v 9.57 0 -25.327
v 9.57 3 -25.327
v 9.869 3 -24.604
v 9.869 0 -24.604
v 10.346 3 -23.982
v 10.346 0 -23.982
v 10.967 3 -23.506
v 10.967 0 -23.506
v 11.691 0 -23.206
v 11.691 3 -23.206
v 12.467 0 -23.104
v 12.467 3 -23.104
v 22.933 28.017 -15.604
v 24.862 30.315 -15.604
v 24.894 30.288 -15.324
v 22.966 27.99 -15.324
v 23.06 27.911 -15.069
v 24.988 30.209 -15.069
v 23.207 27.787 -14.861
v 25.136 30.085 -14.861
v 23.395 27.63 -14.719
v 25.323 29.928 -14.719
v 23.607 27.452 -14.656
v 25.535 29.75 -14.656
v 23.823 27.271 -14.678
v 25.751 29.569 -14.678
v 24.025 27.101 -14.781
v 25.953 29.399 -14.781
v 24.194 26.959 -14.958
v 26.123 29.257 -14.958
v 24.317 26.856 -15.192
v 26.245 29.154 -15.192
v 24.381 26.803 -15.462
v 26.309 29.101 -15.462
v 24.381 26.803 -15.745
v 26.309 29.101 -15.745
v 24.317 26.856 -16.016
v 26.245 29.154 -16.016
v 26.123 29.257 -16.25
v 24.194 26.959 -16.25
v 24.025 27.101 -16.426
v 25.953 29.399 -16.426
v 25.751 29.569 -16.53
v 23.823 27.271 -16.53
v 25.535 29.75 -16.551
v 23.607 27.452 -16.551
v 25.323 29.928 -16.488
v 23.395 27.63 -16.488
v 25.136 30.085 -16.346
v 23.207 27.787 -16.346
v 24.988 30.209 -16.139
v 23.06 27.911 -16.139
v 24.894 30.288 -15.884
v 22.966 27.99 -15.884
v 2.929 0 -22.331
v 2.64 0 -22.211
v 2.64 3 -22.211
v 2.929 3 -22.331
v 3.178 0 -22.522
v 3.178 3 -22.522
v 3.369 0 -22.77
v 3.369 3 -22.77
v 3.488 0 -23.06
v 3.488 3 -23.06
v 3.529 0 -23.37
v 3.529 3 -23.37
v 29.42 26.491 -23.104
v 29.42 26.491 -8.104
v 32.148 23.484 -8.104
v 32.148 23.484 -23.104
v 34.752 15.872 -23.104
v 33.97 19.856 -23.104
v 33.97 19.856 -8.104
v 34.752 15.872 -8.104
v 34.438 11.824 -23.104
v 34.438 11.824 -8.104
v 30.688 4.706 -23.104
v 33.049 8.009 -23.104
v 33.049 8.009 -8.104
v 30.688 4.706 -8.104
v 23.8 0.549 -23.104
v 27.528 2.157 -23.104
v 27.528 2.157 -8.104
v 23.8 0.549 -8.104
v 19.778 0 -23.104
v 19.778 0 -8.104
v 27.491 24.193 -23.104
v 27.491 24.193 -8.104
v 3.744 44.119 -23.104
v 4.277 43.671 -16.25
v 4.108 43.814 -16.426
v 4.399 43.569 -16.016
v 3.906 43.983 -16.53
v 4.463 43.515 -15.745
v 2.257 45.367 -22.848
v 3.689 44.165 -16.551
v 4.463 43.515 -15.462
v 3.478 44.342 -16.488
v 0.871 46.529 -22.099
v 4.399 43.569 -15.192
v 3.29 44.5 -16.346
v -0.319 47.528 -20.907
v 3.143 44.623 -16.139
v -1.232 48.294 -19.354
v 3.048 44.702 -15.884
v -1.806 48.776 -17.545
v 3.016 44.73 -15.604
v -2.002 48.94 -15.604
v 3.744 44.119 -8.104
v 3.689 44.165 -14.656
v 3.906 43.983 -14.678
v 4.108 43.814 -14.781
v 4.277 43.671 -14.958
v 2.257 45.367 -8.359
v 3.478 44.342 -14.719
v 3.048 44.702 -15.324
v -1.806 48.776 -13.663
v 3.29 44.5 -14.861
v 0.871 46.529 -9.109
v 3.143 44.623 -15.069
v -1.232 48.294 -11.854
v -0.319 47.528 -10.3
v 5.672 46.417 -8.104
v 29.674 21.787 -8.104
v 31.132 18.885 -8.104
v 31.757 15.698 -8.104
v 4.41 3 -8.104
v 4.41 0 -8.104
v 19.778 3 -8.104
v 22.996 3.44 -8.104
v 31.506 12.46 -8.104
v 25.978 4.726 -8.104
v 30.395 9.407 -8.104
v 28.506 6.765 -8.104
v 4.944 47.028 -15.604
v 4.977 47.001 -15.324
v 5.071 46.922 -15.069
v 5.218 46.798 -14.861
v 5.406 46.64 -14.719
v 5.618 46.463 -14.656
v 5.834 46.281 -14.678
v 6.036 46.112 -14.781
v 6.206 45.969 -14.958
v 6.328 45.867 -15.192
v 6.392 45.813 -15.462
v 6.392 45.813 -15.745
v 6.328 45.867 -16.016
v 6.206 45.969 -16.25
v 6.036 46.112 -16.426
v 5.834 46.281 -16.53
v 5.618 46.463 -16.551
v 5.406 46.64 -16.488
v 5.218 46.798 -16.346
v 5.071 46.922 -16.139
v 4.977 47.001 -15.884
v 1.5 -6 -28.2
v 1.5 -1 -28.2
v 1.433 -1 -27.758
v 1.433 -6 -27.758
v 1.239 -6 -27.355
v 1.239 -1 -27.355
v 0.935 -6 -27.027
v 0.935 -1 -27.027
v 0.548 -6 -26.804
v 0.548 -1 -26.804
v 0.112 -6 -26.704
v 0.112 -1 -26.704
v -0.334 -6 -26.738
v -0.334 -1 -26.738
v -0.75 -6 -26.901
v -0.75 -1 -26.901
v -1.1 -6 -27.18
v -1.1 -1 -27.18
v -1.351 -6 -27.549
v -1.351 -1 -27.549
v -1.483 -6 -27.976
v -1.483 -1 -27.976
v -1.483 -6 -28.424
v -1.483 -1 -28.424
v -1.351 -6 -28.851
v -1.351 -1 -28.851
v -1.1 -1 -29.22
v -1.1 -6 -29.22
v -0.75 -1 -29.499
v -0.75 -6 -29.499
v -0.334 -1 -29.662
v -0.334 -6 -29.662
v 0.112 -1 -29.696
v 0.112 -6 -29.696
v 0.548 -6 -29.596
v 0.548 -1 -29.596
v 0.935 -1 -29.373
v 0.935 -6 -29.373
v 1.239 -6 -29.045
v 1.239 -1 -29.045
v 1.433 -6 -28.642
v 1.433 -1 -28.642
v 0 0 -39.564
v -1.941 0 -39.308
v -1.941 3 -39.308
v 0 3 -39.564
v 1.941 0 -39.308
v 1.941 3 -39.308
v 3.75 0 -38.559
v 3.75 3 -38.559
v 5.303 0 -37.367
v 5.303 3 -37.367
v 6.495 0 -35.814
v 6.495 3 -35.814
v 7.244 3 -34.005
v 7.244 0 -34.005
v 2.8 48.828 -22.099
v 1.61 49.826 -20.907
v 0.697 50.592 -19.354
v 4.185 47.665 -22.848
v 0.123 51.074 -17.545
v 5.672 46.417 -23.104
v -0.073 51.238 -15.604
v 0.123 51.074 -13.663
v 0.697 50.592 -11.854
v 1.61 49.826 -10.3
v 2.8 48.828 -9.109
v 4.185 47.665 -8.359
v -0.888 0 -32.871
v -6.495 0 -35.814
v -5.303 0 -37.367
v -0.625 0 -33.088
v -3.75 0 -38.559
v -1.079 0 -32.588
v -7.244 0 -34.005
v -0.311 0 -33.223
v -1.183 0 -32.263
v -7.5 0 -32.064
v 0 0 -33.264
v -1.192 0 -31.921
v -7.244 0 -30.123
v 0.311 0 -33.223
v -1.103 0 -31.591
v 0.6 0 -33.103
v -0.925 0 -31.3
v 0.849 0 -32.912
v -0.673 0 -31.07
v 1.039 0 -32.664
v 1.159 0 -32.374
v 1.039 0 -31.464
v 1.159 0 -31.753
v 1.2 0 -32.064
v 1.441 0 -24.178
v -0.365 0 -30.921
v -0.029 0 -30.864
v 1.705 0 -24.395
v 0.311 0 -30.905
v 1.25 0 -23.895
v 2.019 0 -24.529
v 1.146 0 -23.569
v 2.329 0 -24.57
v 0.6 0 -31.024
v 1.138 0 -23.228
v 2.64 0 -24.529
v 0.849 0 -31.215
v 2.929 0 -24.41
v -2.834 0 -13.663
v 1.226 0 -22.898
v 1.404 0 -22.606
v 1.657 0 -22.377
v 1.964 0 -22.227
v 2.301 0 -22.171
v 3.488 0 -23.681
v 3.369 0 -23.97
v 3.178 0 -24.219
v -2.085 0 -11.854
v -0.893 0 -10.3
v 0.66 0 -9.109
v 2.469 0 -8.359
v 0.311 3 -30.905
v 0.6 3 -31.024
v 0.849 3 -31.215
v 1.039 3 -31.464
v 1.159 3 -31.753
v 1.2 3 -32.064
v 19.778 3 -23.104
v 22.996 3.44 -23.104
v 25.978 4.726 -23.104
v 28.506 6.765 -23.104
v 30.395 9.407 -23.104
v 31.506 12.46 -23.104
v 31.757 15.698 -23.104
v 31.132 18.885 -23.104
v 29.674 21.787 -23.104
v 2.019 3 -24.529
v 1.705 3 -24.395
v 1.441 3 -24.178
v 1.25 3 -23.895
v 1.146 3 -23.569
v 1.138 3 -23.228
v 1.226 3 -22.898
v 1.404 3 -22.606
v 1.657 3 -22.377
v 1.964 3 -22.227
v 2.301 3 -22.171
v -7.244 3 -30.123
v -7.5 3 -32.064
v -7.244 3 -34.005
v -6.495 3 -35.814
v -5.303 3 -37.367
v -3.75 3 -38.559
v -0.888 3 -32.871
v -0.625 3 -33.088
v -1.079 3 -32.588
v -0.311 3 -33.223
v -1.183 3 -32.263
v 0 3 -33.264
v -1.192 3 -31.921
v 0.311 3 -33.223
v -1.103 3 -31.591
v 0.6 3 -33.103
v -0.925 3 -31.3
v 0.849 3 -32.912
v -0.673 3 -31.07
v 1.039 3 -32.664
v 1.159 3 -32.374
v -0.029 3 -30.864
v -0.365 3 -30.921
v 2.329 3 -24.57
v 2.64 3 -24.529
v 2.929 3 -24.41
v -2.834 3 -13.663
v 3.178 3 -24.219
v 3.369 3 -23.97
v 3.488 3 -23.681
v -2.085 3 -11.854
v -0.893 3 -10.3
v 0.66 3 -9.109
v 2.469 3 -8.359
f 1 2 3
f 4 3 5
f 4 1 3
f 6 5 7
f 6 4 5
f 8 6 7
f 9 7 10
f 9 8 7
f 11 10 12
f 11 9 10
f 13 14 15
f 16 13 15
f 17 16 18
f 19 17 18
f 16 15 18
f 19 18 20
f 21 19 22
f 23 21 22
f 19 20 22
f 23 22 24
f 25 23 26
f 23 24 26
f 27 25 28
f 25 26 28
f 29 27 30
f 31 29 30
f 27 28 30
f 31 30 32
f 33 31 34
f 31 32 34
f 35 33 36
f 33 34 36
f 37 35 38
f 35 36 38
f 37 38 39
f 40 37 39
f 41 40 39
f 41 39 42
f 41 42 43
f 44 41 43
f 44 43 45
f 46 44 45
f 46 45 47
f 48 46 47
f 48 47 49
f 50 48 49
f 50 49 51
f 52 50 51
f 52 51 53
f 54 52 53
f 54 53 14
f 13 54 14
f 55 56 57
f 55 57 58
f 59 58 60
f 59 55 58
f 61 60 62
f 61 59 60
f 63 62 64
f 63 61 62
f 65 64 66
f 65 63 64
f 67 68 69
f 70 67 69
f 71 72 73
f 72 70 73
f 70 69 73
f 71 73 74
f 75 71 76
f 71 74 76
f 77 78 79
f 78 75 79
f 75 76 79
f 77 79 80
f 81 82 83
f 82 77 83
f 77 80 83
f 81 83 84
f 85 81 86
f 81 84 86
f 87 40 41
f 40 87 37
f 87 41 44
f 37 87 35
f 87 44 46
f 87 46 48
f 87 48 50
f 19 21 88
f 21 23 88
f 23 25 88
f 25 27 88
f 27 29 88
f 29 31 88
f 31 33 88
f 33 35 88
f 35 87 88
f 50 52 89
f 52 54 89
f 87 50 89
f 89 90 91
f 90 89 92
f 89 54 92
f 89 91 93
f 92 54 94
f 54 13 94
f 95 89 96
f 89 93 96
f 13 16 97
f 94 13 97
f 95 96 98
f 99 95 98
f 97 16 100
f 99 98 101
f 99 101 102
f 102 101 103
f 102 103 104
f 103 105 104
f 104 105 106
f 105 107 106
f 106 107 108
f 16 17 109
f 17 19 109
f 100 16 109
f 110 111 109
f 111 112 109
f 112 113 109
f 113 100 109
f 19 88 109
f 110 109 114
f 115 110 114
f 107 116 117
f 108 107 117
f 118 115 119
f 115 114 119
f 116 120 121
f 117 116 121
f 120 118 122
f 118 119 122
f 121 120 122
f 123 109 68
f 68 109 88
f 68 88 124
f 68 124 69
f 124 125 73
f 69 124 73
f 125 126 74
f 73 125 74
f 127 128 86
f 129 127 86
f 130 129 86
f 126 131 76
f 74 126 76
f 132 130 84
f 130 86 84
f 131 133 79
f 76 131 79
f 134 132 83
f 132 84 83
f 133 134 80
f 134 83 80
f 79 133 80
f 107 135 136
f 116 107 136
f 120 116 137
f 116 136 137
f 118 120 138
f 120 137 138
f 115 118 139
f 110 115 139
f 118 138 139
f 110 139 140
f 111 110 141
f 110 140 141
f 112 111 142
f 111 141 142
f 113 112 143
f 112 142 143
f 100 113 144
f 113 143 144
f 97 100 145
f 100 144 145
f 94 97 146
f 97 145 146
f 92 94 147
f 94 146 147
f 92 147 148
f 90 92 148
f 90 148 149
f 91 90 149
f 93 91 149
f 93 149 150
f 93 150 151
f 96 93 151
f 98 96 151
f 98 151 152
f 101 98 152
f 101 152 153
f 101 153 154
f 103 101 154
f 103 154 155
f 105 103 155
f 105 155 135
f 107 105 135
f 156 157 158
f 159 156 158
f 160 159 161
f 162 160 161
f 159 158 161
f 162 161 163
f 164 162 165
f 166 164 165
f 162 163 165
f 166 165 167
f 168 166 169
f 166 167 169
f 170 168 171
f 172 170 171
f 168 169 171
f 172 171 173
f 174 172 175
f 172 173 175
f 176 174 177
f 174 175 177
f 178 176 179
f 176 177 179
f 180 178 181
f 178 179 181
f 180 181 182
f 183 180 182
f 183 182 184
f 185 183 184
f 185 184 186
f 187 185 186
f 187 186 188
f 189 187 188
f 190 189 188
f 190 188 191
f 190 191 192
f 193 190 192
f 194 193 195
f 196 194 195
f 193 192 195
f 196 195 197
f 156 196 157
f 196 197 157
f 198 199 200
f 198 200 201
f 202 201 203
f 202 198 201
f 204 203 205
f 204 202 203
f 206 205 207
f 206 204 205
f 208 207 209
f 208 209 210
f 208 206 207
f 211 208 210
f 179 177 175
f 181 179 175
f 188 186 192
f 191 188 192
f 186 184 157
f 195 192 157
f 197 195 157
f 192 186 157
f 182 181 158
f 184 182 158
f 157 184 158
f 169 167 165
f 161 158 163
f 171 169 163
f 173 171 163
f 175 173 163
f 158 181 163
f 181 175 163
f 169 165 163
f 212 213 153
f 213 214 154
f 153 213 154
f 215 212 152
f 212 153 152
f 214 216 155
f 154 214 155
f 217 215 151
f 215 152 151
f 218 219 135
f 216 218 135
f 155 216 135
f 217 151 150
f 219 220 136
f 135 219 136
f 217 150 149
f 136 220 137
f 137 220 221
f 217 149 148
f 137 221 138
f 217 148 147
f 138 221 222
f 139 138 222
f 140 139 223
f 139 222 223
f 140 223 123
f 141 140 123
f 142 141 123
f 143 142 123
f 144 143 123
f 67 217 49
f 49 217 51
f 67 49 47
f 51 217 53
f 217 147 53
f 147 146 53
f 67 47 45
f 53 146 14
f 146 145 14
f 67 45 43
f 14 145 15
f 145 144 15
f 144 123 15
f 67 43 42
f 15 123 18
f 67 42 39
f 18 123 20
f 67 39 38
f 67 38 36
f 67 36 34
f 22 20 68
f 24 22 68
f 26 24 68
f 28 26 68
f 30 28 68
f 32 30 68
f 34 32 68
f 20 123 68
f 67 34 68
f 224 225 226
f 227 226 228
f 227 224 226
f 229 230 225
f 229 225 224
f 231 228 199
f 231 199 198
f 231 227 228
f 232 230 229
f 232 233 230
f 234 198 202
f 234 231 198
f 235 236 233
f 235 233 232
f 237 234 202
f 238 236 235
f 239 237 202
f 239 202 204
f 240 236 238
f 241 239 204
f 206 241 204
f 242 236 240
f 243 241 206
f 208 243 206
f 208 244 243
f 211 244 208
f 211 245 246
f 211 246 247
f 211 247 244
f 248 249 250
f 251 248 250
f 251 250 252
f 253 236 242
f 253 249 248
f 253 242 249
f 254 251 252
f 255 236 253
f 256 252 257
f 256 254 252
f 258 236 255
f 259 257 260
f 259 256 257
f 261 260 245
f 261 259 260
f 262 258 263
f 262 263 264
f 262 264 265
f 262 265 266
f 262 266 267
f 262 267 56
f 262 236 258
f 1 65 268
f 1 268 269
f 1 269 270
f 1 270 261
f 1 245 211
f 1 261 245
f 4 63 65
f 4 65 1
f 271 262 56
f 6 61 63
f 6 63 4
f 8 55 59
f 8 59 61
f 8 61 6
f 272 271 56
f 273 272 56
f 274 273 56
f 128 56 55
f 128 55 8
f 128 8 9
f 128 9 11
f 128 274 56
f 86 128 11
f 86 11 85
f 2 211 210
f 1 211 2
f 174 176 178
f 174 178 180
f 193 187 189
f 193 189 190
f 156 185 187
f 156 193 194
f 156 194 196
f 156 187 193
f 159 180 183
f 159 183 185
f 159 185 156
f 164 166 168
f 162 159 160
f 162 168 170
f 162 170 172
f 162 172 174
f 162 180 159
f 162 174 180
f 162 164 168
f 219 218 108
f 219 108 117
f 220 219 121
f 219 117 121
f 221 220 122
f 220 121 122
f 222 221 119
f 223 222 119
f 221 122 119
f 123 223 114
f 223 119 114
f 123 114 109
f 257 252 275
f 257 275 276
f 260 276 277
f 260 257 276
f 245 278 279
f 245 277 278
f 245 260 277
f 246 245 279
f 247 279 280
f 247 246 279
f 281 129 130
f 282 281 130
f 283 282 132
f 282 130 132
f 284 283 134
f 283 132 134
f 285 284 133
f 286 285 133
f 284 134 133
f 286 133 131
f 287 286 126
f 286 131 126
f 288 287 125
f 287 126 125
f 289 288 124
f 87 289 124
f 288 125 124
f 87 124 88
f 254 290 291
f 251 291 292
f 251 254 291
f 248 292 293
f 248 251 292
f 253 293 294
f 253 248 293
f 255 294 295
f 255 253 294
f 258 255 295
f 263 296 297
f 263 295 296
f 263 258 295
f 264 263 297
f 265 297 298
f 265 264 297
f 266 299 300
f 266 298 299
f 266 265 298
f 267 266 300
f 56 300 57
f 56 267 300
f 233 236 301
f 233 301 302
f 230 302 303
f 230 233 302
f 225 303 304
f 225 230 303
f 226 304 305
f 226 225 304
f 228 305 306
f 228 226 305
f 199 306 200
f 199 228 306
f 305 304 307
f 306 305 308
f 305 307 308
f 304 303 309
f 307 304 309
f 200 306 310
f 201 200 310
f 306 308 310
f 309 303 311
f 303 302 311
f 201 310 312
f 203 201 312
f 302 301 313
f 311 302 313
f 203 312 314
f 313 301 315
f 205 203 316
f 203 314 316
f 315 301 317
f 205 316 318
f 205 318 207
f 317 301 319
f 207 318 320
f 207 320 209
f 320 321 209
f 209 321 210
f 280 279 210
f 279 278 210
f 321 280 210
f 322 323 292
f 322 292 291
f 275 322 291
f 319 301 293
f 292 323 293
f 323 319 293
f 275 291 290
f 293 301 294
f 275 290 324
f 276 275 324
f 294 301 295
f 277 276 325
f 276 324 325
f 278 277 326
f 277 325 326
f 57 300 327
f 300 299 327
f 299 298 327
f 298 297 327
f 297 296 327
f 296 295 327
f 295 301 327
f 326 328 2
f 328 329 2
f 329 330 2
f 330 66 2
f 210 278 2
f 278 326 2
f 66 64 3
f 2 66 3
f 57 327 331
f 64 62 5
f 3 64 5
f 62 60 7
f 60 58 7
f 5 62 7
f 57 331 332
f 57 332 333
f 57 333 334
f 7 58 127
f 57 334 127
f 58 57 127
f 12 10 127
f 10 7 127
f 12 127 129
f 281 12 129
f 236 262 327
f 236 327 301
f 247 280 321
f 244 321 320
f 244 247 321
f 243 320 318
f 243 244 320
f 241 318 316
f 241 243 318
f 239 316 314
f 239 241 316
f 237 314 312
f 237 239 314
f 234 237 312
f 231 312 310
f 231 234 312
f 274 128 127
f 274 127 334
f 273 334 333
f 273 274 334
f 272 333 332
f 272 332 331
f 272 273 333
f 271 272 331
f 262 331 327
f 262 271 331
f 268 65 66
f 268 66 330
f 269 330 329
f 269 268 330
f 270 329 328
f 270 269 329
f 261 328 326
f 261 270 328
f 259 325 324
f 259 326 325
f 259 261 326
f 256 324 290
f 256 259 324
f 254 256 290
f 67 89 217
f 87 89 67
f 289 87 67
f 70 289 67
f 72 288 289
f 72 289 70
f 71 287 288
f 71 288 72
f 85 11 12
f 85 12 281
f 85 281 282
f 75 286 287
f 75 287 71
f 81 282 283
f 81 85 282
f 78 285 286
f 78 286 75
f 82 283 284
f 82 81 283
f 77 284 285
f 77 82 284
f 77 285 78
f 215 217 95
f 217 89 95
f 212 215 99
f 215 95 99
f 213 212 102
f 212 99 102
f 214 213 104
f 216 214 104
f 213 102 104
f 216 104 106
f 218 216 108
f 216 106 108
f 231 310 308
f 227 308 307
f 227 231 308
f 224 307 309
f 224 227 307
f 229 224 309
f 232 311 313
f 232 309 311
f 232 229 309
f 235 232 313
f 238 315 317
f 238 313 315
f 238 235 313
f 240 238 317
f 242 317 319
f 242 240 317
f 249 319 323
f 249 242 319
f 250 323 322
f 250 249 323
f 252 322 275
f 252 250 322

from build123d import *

# Parameters (mm, degrees)
F3_R      = 1.5
F4_DEPTH  = 5
F1_R      = 2.15
F5_DEPTH  = 25
F7_W      = 88.294127956
F7_H      = 15
F8_DEPTH  = 50
F0_W      = 181.6474571824
F0_H      = 159.0860895813
F9_DEPTH  = 39.5647038297
F10_R     = 0.95
F11_DEPTH = 5
F12_R     = 7.49999


# Not quite as in the source:
# - a fillet or chamfer is up to 0.001 mm smaller than in the source, because OpenCascade refuses the exact size


with BuildPart() as f4:
    # F3 (on offset) → F4 (new body)
    with BuildSketch(Plane.XZ.offset(1)):
        with Locations((0, -28.2000005245)):
            Circle(F3_R)
    extrude(amount=F4_DEPTH)


with BuildPart() as f5:
    # F1 (on Front) → F5 (new body)
    with BuildSketch(Plane.XZ):
        with BuildLine():
            ThreePointArc((-1.9411428383, -39.3081475268), (3.75, -38.5588943581), (7.2444436972, -34.0048466679))
            Line((7.2444436972, -34.0048466679), (9.5695999627, -25.3272453493))
            ThreePointArc((9.5695999627, -25.3272453493), (10.6410931546, -23.7236424637), (12.4673774416, -23.1037024846))
            Line((12.4673774416, -23.1037024846), (80.0844150527, -23.1037024846))
            ThreePointArc((80.0844150527, -23.1037024846), (87.5844150527, -15.6037024846), (80.0844150527, -8.1037024846))
            Line((80.0844150527, -8.1037024846), (49.0844150527, -8.1037024846))
            Line((49.0844150527, -8.1037024846), (19.777748386, -8.1037024846))
            Line((19.777748386, -8.1037024846), (4.4104440678, -8.1037024846))
            ThreePointArc((4.4104440678, -8.1037024846), (-0.1552666497, -9.6535524324), (-2.8339996293, -13.6625596463))
            Line((-2.8339996293, -13.6625596463), (-7.2444436972, -30.1225609914))
            ThreePointArc((-7.2444436972, -30.1225609914), (-6.4951905284, -35.8137038297), (-1.9411428383, -39.3081475268))
        make_face()
        with BuildLine():
            ThreePointArc((1.2, -32.0637038297), (0.7305137148, -33.015727838), (-0.3105828541, -33.2228148212))
            ThreePointArc((-0.3105828541, -33.2228148212), (-1.1591109915, -31.7531209756), (0.3105828541, -30.9045928381))
            ThreePointArc((0.3105828541, -30.9045928381), (0.9520240083, -31.3331901149), (1.2, -32.0637038297))
        make_face(mode=Mode.SUBTRACT)
        with BuildLine():
            ThreePointArc((3.5293714059, -23.3703713931), (3.0598851207, -24.3223954014), (2.0187885518, -24.5294823846))
            ThreePointArc((2.0187885518, -24.5294823846), (1.1702604144, -23.059788539), (2.63995426, -22.2112604015))
            ThreePointArc((2.63995426, -22.2112604015), (3.2813954143, -22.6398576783), (3.5293714059, -23.3703713931))
        make_face(mode=Mode.SUBTRACT)
        with Locations((54.0844150527, -15.6037024846)):
            Circle(F1_R, mode=Mode.SUBTRACT)
        with Locations((80.0844150527, -15.6037024846)):
            Circle(F1_R, mode=Mode.SUBTRACT)
    extrude(amount=-F5_DEPTH)

    # F7 (on offset) → F8 (join)
    with BuildSketch(Plane.XZ.offset(-25)):
        with Locations((17.6047375426, -15.6037024846)):
            Rectangle(F7_W, F7_H)
    extrude(amount=-F8_DEPTH)

    # F0 (on Top) → F9 (cut, through all)
    with BuildSketch(Plane.XY):
        with BuildLine():
            ThreePointArc((186.4293499082, 37.2767830718), (189.1206068421, 41.7118372377), (194.29723209, 41.3725432932))
            Line((194.29723209, 41.3725432932), (212.3185770643, 28.7538616935))
            Line((212.3185770643, 28.7538616935), (214.0393063734, 31.2113178264))
            Line((214.0393063734, 31.2113178264), (196.017961399, 43.8299994261))
            ThreePointArc((196.017961399, 43.8299994261), (187.7353610024, 44.3728697372), (183.4293499082, 37.2767830718))
            Line((183.4293499082, 37.2767830718), (183.4293499082, 8.5356936807))
            ThreePointArc((183.4293499082, 8.5356936807), (181.9648838142, 5.0001597747), (178.4293499082, 3.5356936807))
            Line((178.4293499082, 3.5356936807), (134.4964219123, 3.5356936807))
            Line((134.4964219123, 3.5356936807), (134.4964219123, 0.5356936807))
            Line((134.4964219123, 0.5356936807), (178.4293499082, 0.5356936807))
            ThreePointArc((178.4293499082, 0.5356936807), (184.0862041577, 2.8788394312), (186.4293499082, 8.5356936807))
            Line((186.4293499082, 8.5356936807), (186.4293499082, 37.2767830718))
        make_face()
        with Locations((32.1800746024, 51.0744024068)):
            Rectangle(F0_W, F0_H)
        with BuildLine():
            Line((19.777748386, 0), (0, 0))
            Line((0, 0), (-38.4993149038, 0))
            Line((-38.4993149038, 0), (-38.4993149038, 3))
            Line((-38.4993149038, 3), (0, 3))
            Line((0, 3), (19.777748386, 3))
            ThreePointArc((19.777748386, 3), (31.0540598354, 10.8957582801), (27.4911997022, 24.1925333174))
            Line((27.4911997022, 24.1925333174), (-2.0015113578, 48.9398562904))
            Line((-2.0015113578, 48.9398562904), (-0.0731485288, 51.2379896197))
            Line((-0.0731485288, 51.2379896197), (29.4195625313, 26.4906666468))
            ThreePointArc((29.4195625313, 26.4906666468), (33.8731376978, 9.8696978501), (19.777748386, 0))
        make_face(mode=Mode.SUBTRACT)
    extrude(amount=-F9_DEPTH, mode=Mode.SUBTRACT)

    # F10 (on face) → F11 (cut)
    with BuildSketch(Plane(origin=(25.1995615031, 30.0316679531, 0), x_dir=(-0.7660444431, 0.6427876097, 0), z_dir=(0.6427876097, 0.7660444431, 0))):
        with Locations((25.4911798968, -15.6037024846)):
            Circle(F10_R)
        with Locations((-0.5088201032, -15.6037024846)):
            Circle(F10_R)
    extrude(amount=-F11_DEPTH, mode=Mode.SUBTRACT)

    # F12 (radius 7.5 in the source; OpenCascade refuses exactly that, so slightly less here)
    f12_edges = [f5.edges().sort_by_distance(p)[0] for p in [
        (-1.03733, 50.088923, -8.103702),
        (-1.03733, 50.088923, -23.103702),
    ]]
    fillet(f12_edges, radius=F12_R)


solid = Compound([f4.part, f5.part])
